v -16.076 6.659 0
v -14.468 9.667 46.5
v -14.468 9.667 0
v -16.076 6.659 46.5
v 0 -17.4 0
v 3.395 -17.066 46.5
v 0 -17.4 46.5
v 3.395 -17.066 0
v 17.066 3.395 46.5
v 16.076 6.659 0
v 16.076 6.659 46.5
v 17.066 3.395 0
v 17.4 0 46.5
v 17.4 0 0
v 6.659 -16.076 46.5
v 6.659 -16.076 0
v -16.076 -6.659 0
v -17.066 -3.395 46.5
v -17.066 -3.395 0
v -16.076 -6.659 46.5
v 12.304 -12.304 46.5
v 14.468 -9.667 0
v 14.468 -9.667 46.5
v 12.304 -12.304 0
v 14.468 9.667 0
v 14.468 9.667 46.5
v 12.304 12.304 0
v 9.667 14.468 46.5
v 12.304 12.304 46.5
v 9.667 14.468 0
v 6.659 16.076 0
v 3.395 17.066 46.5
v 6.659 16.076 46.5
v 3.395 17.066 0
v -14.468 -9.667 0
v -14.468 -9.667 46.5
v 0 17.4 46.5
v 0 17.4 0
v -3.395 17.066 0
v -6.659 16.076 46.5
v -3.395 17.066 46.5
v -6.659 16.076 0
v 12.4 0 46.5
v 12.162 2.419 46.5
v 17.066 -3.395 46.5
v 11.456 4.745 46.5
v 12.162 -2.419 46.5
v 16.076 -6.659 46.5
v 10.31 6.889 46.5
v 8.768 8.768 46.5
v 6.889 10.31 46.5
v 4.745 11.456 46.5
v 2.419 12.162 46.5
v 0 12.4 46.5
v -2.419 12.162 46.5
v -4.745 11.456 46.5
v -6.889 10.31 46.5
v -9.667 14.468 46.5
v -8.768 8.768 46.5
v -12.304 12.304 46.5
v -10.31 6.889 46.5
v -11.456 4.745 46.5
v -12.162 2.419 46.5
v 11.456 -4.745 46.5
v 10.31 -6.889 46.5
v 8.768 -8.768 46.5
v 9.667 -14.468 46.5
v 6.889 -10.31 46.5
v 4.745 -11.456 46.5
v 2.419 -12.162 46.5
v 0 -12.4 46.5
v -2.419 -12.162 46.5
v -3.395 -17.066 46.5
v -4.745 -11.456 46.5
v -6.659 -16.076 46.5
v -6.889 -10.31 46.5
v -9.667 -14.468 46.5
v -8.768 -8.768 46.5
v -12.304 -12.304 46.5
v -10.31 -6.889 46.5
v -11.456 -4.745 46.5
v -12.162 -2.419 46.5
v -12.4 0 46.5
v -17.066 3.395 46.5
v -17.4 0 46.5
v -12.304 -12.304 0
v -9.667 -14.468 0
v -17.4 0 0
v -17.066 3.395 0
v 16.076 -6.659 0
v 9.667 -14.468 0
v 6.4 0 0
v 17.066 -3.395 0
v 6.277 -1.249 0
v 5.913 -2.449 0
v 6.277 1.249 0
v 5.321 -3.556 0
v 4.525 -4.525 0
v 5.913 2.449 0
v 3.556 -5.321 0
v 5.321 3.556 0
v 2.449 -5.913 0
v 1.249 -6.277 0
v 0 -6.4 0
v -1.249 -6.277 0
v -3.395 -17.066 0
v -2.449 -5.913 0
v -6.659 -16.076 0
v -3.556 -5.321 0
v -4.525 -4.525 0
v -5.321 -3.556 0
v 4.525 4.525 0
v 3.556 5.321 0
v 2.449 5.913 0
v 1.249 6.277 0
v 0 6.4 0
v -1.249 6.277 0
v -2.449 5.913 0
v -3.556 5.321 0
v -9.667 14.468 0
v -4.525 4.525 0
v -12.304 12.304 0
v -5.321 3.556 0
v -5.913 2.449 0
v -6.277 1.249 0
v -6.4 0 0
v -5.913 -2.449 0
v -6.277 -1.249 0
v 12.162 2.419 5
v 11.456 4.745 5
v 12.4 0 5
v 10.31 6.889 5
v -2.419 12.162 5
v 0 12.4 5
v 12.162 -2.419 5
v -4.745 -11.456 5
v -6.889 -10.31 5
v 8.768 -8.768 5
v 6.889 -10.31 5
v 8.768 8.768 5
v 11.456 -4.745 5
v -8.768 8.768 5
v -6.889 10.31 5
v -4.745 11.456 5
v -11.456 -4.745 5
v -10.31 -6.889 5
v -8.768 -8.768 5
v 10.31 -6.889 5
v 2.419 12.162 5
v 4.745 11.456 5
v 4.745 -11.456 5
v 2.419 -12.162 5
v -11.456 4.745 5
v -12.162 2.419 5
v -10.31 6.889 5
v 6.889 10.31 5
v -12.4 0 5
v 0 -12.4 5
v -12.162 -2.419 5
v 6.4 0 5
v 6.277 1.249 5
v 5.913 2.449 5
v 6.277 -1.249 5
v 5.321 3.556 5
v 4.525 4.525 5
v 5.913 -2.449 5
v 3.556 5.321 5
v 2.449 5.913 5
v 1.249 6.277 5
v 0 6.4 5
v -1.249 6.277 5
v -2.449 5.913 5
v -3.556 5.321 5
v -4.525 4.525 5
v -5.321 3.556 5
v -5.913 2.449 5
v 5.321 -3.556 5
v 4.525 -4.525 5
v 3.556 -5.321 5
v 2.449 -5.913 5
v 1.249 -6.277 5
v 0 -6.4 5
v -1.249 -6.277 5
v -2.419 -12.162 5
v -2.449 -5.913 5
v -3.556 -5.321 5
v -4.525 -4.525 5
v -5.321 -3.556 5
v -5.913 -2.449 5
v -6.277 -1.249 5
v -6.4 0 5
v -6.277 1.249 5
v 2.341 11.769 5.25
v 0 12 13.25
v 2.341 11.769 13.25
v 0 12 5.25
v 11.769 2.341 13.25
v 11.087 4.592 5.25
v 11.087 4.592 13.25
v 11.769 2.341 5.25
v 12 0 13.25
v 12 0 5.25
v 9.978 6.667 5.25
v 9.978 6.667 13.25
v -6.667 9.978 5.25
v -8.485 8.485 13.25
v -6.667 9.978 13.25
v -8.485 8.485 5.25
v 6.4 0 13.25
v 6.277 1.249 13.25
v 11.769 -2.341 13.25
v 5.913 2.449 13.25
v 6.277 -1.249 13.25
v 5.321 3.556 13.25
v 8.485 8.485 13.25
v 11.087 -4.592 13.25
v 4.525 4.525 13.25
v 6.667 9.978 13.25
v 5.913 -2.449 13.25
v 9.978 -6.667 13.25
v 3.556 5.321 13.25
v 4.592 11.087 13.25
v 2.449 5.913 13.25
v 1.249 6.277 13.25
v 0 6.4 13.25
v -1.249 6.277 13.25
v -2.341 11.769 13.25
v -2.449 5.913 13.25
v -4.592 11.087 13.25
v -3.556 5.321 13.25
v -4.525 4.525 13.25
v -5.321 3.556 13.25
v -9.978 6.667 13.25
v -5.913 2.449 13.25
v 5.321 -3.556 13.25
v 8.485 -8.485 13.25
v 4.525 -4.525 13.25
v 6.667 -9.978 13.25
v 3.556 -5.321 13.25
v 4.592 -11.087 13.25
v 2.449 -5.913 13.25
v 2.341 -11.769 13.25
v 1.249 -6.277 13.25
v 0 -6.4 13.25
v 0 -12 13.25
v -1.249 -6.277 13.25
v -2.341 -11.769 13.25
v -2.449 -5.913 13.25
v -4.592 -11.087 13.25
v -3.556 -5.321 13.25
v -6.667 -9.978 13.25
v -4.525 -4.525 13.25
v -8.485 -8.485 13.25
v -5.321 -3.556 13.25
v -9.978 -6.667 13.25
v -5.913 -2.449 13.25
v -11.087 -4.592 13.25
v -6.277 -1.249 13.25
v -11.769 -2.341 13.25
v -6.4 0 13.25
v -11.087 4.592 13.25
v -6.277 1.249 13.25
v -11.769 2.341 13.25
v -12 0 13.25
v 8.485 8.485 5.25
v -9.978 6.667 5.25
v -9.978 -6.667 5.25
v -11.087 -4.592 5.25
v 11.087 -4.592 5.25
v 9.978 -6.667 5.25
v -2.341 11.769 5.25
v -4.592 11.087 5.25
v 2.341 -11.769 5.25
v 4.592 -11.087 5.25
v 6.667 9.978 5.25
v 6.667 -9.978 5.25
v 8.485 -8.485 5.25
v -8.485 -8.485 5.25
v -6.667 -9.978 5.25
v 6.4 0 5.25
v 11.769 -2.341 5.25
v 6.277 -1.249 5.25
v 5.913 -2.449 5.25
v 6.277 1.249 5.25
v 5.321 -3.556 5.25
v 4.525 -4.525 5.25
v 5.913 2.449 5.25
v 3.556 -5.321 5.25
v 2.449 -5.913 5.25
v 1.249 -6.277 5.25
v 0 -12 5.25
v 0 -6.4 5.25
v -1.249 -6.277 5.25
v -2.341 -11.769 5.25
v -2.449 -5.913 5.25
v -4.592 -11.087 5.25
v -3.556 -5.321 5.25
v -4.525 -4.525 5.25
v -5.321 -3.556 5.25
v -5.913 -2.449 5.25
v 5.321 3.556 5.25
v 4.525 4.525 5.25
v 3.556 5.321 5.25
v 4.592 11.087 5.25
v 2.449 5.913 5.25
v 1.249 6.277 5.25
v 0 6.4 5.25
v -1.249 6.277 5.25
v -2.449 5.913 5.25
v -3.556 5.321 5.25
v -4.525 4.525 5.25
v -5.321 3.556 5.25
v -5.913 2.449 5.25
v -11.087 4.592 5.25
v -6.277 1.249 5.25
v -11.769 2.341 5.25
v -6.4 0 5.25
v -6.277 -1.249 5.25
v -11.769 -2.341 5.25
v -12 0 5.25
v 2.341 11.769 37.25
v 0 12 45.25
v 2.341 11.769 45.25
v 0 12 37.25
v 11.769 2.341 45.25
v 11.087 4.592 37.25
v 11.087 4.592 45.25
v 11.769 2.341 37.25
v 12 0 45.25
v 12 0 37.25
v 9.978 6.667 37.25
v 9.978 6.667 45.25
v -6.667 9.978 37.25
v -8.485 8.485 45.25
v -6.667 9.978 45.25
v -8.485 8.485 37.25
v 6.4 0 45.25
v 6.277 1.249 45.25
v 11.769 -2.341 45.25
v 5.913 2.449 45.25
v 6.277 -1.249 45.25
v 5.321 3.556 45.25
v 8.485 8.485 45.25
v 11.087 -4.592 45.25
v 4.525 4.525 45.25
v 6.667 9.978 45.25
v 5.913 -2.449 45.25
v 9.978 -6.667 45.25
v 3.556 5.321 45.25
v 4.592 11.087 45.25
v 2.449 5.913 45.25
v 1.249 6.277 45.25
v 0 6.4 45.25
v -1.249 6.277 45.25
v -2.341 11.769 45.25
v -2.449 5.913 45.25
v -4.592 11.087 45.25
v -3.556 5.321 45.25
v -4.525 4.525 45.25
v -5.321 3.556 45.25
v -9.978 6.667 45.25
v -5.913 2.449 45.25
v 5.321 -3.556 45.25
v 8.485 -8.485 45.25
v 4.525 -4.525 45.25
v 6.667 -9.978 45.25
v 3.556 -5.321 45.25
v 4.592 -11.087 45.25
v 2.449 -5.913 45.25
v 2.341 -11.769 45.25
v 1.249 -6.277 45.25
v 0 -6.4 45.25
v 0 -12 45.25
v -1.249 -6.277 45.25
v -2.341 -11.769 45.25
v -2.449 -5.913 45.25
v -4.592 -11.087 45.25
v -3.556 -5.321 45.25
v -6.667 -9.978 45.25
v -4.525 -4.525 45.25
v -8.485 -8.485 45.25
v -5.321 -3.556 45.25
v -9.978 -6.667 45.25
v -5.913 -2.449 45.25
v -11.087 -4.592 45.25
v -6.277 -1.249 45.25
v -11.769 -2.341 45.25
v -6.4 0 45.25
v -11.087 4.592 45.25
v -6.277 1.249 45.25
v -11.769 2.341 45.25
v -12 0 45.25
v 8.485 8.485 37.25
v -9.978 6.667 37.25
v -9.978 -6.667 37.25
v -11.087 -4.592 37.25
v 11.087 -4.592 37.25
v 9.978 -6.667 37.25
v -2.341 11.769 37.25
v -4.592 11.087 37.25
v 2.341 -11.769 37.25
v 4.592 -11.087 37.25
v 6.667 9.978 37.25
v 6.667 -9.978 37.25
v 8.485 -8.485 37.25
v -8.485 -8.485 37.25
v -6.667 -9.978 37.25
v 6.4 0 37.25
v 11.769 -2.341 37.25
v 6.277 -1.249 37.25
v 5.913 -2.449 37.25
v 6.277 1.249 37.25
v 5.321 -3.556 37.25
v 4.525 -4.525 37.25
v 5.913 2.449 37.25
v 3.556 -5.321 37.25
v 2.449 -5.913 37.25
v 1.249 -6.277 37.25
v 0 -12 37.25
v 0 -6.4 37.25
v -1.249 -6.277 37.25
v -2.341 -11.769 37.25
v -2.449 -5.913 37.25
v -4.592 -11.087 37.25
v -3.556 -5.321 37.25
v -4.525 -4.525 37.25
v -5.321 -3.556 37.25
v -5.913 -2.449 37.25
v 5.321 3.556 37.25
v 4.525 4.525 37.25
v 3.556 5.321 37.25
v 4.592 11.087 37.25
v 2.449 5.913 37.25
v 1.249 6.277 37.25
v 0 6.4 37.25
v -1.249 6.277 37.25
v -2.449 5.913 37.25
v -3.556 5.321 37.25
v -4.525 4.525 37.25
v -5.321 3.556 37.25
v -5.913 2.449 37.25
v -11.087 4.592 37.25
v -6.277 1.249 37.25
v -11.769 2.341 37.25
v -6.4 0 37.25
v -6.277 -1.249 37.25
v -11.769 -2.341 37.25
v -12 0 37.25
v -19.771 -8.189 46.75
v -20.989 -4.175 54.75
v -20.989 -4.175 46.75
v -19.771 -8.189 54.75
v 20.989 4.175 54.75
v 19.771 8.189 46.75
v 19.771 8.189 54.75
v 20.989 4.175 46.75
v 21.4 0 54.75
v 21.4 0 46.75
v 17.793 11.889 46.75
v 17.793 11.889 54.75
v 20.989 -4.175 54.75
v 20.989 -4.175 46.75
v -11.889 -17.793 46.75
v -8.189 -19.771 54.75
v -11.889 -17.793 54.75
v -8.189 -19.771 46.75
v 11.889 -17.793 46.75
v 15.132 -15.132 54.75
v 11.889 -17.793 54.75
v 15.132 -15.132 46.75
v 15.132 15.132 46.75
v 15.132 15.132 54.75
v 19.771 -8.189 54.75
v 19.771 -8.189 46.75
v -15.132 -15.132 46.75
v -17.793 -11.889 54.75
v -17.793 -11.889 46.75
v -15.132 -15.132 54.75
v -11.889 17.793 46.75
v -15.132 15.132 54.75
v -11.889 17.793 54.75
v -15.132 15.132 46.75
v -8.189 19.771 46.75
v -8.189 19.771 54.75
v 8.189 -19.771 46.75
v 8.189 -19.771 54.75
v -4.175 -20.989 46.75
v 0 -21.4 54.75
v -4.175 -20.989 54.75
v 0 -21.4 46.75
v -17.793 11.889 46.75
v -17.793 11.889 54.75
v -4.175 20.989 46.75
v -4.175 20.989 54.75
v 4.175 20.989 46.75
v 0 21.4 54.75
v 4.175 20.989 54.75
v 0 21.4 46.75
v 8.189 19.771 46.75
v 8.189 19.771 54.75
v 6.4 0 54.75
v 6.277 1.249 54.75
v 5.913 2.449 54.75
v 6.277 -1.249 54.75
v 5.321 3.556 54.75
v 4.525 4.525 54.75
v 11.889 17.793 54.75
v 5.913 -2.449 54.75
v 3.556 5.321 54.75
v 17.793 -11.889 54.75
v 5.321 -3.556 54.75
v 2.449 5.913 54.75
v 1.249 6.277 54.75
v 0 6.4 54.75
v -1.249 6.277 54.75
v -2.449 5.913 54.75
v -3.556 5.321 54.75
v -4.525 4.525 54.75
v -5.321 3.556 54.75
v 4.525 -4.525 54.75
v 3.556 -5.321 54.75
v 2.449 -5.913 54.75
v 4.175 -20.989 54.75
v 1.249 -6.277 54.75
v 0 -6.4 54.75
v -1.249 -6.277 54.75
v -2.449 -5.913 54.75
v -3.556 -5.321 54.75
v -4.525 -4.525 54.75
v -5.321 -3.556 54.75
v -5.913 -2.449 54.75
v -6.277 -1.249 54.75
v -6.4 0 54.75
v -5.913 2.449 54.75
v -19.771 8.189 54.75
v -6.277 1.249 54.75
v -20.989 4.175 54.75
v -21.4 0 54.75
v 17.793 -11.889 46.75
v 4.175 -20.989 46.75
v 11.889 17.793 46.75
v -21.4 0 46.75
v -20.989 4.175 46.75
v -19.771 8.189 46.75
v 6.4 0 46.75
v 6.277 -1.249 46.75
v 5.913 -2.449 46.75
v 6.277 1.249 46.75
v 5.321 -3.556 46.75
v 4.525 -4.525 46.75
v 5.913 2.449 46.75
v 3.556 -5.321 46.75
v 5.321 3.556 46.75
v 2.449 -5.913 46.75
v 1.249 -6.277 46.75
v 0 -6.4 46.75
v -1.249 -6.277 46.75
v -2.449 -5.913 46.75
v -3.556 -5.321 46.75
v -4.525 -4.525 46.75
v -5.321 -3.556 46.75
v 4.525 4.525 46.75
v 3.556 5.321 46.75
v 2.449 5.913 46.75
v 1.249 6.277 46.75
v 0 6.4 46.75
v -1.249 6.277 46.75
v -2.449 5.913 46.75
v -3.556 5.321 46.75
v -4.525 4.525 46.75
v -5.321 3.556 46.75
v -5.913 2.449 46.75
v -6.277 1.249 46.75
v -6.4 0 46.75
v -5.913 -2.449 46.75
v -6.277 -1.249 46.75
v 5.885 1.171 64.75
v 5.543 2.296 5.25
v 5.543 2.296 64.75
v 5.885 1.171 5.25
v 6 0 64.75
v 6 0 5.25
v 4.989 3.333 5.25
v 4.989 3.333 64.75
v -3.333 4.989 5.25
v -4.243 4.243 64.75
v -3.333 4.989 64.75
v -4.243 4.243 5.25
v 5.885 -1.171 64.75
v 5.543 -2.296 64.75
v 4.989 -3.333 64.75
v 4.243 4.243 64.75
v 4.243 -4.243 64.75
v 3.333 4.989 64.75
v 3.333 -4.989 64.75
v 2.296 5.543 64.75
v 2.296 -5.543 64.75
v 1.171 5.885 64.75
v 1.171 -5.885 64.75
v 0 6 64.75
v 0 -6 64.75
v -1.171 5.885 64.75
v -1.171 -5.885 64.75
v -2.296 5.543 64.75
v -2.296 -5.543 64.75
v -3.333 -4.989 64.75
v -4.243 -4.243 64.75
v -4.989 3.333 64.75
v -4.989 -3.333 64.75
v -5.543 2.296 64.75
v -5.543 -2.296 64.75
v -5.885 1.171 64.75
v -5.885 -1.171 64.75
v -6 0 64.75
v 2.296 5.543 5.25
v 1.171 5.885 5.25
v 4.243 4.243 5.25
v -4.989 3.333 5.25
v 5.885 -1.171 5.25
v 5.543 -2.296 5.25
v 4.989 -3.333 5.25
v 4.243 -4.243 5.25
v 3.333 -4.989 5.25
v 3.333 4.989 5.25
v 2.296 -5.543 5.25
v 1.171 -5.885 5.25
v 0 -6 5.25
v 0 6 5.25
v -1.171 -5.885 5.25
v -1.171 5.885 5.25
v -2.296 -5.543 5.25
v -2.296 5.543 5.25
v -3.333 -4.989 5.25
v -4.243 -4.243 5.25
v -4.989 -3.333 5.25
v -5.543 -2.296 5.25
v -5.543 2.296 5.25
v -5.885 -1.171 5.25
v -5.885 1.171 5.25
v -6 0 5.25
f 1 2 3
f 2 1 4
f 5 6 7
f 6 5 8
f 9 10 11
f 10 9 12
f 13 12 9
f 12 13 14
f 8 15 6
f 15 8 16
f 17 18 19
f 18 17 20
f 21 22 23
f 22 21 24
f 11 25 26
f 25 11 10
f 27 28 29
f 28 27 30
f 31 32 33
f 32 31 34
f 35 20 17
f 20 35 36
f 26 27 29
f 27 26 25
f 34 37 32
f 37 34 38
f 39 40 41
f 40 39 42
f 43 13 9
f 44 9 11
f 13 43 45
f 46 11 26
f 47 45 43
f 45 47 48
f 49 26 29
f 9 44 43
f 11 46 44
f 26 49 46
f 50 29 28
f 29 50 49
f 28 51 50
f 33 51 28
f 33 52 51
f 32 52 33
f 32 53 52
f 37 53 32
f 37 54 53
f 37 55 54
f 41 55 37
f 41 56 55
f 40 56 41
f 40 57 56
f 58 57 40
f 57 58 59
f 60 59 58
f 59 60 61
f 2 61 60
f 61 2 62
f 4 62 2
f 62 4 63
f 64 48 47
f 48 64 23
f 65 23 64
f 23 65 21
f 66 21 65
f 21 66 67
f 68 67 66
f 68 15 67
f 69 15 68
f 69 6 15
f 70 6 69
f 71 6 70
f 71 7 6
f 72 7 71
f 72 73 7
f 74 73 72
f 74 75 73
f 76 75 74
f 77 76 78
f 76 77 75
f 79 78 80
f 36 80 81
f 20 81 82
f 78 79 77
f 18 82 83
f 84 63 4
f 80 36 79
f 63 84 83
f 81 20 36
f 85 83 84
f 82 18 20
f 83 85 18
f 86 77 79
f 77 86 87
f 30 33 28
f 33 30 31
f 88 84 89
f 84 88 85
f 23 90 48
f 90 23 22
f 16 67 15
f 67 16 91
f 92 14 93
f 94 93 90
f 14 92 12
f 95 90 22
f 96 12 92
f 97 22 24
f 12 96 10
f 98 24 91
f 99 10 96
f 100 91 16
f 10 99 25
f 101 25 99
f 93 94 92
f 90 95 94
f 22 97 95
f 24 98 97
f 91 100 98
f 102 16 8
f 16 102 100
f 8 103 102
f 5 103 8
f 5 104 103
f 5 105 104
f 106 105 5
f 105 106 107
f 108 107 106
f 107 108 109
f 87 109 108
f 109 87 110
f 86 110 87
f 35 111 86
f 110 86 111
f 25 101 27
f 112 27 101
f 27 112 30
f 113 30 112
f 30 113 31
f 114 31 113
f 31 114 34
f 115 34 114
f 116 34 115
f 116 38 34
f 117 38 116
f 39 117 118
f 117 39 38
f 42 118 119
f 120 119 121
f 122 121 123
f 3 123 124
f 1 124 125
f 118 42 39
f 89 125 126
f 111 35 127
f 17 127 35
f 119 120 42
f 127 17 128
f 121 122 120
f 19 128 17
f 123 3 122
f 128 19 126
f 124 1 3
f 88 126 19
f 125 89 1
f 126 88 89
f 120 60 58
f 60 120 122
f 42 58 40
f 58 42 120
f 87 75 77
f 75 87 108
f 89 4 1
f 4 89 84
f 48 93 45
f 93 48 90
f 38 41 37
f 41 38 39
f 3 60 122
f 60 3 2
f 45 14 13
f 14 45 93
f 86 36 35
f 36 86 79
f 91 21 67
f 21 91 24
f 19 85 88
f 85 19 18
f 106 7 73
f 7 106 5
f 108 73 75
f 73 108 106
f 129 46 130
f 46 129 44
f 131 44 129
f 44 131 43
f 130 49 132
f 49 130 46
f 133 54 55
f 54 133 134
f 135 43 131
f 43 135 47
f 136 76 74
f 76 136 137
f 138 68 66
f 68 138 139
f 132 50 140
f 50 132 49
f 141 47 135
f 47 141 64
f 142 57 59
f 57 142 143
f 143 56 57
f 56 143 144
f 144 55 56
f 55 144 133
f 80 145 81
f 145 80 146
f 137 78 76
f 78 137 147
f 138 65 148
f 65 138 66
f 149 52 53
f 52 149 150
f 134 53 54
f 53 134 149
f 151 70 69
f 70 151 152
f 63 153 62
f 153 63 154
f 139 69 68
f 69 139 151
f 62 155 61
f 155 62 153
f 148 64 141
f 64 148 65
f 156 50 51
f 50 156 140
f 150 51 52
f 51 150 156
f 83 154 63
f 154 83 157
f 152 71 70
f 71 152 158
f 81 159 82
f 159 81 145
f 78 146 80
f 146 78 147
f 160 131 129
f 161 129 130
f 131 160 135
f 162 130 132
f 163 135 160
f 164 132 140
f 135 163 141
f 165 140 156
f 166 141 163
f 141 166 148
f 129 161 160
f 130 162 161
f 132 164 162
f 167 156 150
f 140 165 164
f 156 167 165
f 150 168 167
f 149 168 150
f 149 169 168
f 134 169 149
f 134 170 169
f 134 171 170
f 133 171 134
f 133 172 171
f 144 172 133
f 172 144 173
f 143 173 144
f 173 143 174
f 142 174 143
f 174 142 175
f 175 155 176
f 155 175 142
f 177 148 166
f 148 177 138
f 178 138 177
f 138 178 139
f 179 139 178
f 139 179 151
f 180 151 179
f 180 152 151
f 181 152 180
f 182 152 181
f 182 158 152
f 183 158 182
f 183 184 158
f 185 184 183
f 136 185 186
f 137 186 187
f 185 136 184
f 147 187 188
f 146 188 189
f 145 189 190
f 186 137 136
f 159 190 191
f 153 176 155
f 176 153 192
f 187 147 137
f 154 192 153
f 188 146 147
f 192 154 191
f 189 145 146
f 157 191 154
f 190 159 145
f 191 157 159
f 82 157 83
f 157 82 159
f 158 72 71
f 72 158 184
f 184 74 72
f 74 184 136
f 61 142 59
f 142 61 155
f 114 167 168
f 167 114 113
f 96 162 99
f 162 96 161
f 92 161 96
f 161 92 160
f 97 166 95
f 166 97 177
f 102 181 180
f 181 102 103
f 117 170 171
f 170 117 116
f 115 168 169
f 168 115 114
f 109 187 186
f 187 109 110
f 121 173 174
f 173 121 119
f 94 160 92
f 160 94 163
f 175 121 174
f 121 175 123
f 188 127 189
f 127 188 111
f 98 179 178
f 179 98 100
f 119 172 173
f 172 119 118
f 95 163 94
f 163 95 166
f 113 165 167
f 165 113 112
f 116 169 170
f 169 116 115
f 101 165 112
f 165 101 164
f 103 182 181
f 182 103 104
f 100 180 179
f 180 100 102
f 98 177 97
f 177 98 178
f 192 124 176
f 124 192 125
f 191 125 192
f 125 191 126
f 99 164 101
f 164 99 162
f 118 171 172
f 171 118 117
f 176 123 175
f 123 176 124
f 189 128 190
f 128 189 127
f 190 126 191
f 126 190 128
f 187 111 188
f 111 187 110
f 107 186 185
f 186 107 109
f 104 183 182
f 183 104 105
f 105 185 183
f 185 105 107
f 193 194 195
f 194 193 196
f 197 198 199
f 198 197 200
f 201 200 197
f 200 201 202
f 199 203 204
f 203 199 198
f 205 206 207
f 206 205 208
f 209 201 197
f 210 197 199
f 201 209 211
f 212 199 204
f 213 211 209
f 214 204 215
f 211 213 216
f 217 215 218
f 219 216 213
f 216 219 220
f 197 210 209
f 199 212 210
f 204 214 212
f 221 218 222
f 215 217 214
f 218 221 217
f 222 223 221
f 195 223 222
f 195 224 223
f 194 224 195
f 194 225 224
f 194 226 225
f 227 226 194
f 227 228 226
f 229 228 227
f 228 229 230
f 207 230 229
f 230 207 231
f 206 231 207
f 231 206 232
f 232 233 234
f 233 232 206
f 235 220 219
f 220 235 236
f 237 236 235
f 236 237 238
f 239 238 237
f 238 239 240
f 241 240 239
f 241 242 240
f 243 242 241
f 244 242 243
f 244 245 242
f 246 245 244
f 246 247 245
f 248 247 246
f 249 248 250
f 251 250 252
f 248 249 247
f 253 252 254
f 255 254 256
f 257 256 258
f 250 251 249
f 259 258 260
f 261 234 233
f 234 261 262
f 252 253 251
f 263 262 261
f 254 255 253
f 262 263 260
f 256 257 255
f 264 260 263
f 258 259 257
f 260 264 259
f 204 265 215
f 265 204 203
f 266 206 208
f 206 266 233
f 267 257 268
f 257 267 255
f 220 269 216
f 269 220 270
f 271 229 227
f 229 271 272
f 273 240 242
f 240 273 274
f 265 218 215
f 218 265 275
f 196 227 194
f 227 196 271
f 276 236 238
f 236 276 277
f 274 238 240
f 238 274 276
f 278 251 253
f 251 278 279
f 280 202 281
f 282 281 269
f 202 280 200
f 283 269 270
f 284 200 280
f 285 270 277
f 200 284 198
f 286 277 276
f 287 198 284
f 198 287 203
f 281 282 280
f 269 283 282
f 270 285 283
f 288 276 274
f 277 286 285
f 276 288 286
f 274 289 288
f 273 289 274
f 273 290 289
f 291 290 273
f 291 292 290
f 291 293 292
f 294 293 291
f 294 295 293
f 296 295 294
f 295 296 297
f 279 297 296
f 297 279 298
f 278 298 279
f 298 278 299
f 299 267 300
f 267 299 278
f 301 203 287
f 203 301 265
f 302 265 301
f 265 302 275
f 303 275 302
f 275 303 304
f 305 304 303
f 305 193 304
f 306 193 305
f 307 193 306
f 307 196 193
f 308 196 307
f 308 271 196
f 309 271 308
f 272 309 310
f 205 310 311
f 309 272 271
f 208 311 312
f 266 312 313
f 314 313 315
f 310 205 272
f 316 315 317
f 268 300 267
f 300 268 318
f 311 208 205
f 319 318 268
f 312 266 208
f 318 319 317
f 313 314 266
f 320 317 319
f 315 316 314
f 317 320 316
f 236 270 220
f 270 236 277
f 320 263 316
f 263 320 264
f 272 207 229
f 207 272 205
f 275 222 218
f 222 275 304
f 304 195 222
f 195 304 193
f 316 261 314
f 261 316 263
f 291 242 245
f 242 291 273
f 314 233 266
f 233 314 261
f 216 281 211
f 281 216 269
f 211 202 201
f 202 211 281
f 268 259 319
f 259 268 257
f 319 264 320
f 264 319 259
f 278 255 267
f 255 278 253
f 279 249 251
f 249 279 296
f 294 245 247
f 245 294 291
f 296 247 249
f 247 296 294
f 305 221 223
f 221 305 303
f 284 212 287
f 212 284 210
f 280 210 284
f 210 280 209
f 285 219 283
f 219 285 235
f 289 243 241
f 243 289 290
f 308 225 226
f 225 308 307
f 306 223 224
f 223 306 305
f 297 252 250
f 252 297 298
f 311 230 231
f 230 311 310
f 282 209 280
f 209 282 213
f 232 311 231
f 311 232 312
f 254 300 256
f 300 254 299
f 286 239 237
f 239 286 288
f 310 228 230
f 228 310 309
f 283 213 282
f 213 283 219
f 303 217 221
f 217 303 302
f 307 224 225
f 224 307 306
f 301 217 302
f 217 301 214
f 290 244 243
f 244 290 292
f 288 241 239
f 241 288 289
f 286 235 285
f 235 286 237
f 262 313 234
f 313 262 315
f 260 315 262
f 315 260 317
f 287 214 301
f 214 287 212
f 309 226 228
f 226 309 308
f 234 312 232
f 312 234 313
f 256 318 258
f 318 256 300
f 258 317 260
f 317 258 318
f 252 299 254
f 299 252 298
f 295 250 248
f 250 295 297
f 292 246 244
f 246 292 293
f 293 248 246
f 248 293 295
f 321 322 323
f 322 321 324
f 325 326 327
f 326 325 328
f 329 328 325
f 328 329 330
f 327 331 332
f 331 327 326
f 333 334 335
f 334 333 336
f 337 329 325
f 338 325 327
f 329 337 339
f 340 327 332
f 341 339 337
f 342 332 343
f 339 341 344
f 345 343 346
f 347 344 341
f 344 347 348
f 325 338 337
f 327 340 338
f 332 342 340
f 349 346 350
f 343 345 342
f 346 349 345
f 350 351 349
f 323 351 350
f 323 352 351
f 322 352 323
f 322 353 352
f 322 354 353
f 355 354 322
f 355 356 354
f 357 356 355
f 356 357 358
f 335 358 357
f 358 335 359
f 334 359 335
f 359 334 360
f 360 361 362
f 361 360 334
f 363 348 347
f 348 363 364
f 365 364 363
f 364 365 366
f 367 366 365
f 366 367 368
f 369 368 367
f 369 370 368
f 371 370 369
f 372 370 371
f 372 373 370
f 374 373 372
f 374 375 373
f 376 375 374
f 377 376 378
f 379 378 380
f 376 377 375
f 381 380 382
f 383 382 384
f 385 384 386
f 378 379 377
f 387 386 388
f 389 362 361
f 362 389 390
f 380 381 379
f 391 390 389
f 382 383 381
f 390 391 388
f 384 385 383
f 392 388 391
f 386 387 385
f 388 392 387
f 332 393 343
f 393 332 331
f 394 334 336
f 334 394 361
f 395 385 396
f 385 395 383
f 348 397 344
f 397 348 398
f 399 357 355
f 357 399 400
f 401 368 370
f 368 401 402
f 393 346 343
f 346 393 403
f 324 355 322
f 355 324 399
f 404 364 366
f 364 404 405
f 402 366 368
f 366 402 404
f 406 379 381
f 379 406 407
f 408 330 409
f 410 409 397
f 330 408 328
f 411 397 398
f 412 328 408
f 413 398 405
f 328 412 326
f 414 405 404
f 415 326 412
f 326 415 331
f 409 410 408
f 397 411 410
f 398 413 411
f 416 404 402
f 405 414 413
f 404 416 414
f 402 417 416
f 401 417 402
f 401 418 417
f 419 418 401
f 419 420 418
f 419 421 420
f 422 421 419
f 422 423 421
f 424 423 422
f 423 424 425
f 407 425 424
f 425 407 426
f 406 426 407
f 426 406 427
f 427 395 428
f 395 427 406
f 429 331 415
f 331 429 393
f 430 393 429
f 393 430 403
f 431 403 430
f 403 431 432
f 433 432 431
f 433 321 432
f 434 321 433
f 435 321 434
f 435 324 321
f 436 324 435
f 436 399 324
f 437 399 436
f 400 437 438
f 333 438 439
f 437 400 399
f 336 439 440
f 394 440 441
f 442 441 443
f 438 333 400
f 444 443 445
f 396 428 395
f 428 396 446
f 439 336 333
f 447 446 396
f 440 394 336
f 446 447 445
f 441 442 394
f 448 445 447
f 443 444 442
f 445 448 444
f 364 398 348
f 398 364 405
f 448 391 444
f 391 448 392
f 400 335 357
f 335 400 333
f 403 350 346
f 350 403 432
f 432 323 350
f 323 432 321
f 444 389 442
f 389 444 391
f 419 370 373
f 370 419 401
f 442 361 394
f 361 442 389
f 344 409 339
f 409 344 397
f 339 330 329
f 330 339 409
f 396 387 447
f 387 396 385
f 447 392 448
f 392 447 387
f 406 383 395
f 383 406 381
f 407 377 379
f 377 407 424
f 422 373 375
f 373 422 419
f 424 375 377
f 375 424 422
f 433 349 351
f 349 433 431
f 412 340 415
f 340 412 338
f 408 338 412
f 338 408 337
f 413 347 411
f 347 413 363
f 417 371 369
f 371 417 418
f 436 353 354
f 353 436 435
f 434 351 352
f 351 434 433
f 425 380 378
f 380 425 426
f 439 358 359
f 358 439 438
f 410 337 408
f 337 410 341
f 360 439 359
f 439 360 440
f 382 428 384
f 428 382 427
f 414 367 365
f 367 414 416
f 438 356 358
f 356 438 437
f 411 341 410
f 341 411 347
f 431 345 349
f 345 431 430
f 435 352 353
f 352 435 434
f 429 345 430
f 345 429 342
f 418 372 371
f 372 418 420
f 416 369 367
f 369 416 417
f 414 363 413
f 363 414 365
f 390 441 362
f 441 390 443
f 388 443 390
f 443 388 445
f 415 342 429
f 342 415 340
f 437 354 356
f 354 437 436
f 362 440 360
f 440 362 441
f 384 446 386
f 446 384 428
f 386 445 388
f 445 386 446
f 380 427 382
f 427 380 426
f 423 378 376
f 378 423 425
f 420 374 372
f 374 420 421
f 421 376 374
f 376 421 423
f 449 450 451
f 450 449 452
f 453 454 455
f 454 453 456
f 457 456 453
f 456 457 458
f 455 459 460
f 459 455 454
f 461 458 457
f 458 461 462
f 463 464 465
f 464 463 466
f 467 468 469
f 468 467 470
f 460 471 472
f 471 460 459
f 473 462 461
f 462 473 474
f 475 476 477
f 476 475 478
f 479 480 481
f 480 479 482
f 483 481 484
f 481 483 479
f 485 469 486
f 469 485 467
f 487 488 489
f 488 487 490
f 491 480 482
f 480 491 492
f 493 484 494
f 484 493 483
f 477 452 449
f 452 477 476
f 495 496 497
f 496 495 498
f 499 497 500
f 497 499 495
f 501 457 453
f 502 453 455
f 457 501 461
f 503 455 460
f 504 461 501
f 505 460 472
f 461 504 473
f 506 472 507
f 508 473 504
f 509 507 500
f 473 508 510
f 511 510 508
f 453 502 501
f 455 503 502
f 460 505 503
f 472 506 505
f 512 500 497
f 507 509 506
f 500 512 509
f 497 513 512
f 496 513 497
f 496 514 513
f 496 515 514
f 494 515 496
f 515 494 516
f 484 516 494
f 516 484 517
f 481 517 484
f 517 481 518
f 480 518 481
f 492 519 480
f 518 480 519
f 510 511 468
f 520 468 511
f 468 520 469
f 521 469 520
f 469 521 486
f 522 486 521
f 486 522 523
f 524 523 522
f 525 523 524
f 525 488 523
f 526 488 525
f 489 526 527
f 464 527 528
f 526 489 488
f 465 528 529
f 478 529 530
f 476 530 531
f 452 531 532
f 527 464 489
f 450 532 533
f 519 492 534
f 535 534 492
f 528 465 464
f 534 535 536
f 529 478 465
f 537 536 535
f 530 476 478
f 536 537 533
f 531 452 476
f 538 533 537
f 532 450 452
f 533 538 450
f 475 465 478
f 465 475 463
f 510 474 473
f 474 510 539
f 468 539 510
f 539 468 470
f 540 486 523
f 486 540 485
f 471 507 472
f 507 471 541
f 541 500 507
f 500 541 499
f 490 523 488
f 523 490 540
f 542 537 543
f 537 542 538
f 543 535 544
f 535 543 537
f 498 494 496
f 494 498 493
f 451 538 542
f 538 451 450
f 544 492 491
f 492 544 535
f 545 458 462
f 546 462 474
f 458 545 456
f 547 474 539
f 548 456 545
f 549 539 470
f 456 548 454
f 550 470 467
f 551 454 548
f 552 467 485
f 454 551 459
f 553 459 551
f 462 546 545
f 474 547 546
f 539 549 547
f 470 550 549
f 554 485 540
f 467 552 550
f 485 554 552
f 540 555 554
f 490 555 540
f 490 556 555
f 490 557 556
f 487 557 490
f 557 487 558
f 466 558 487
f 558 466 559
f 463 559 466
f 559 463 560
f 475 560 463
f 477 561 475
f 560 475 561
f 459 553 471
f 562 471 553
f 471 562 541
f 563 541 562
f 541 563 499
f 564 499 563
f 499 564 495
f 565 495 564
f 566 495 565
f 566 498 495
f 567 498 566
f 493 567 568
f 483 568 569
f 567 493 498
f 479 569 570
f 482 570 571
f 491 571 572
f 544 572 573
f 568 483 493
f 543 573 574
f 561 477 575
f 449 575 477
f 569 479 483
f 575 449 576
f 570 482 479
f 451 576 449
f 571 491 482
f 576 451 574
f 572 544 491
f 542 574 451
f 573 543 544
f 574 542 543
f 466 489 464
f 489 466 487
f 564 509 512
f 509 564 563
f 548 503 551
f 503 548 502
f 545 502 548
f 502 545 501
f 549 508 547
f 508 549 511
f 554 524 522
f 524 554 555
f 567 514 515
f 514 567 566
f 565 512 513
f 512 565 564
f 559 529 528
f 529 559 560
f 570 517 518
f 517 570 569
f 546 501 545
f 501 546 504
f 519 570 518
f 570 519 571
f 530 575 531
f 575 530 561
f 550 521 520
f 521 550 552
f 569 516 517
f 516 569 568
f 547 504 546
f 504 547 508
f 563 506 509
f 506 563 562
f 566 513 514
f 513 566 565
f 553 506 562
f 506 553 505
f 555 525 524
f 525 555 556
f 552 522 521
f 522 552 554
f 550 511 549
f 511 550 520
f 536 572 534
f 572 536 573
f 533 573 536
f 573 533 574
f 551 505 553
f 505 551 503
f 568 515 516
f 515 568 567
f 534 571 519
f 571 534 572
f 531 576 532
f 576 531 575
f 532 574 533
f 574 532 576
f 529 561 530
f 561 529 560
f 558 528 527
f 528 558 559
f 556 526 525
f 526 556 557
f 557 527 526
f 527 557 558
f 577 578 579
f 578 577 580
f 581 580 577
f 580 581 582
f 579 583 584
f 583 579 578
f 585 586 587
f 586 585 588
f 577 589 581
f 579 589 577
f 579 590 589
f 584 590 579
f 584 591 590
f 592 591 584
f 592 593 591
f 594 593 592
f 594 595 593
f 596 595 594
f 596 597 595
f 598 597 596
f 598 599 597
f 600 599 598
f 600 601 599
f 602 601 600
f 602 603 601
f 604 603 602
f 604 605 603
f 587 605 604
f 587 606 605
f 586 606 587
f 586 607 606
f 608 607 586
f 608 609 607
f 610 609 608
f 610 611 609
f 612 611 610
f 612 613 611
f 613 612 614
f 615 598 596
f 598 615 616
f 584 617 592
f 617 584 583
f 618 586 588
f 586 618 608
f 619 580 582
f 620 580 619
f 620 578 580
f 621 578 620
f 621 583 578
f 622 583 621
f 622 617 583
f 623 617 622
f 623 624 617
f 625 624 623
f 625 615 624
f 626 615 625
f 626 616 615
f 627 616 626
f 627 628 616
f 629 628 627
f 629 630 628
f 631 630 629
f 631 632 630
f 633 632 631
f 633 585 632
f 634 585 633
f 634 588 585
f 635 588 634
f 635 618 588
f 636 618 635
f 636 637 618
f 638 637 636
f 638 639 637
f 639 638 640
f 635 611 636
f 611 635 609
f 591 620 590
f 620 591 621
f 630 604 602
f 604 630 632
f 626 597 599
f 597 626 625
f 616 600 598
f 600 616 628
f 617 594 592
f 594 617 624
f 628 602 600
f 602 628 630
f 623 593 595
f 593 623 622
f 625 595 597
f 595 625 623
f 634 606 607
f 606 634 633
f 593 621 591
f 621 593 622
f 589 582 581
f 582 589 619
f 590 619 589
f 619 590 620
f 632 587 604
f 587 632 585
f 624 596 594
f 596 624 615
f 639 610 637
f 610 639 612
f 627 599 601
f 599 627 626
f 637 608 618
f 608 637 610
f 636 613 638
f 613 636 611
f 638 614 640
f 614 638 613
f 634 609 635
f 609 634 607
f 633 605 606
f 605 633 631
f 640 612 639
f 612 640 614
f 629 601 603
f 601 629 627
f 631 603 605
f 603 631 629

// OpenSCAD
$fn = 32;

// ------------------------------------------------------------------------
// Shaft station: cup d34.8 x 46.5 mm, shaft d12
// Every part is its own module, assembly() places every instance.
// ------------------------------------------------------------------------

// --- part 1 ---
module housing_cup() {
  difference() {
    cylinder(h = 46.5, d = 34.8);
    translate([0, 0, 5]) cylinder(h = 42.5, d = 24.8);
    translate([0, 0, -1]) cylinder(h = 7, d = 12.8);
  }
}

// --- part 2 ---
module bearing_lower() {
  difference() {
      translate([0, 0, 0]) cylinder(h = 8, d = 24);
      translate([0, 0, -1]) cylinder(h = 10, d = 12.8);
    }
}

// --- part 3 ---
module bearing_upper() {
  difference() {
      translate([0, 0, 0]) cylinder(h = 8, d = 24);
      translate([0, 0, -1]) cylinder(h = 10, d = 12.8);
    }
}

// --- part 4 ---
module station_shaft() {
  translate([0, 0, -29.75]) cylinder(h = 59.5, d = 12);
}

// --- part 5 ---
module station_cover() {
  difference() {
    cylinder(h = 8, d = 42.8);
    translate([0, 0, -1]) cylinder(h = 10, d = 12.8);
  }
}

// --- assembly ---
module assembly() {
  color([0.80, 0.24, 0.20]) translate([0, 0, 0]) rotate([0, 0, 0]) housing_cup();
  color([0.20, 0.45, 0.75]) translate([0, 0, 5.25]) rotate([0, 0, 0]) bearing_lower();
  color([0.25, 0.62, 0.32]) translate([0, 0, 37.25]) rotate([0, 0, 0]) bearing_upper();
  color([0.92, 0.70, 0.18]) translate([0, 0, 35]) rotate([0, 0, 0]) station_shaft();
  color([0.58, 0.35, 0.70]) translate([0, 0, 46.75]) rotate([0, 0, 0]) station_cover();
}

assembly();
